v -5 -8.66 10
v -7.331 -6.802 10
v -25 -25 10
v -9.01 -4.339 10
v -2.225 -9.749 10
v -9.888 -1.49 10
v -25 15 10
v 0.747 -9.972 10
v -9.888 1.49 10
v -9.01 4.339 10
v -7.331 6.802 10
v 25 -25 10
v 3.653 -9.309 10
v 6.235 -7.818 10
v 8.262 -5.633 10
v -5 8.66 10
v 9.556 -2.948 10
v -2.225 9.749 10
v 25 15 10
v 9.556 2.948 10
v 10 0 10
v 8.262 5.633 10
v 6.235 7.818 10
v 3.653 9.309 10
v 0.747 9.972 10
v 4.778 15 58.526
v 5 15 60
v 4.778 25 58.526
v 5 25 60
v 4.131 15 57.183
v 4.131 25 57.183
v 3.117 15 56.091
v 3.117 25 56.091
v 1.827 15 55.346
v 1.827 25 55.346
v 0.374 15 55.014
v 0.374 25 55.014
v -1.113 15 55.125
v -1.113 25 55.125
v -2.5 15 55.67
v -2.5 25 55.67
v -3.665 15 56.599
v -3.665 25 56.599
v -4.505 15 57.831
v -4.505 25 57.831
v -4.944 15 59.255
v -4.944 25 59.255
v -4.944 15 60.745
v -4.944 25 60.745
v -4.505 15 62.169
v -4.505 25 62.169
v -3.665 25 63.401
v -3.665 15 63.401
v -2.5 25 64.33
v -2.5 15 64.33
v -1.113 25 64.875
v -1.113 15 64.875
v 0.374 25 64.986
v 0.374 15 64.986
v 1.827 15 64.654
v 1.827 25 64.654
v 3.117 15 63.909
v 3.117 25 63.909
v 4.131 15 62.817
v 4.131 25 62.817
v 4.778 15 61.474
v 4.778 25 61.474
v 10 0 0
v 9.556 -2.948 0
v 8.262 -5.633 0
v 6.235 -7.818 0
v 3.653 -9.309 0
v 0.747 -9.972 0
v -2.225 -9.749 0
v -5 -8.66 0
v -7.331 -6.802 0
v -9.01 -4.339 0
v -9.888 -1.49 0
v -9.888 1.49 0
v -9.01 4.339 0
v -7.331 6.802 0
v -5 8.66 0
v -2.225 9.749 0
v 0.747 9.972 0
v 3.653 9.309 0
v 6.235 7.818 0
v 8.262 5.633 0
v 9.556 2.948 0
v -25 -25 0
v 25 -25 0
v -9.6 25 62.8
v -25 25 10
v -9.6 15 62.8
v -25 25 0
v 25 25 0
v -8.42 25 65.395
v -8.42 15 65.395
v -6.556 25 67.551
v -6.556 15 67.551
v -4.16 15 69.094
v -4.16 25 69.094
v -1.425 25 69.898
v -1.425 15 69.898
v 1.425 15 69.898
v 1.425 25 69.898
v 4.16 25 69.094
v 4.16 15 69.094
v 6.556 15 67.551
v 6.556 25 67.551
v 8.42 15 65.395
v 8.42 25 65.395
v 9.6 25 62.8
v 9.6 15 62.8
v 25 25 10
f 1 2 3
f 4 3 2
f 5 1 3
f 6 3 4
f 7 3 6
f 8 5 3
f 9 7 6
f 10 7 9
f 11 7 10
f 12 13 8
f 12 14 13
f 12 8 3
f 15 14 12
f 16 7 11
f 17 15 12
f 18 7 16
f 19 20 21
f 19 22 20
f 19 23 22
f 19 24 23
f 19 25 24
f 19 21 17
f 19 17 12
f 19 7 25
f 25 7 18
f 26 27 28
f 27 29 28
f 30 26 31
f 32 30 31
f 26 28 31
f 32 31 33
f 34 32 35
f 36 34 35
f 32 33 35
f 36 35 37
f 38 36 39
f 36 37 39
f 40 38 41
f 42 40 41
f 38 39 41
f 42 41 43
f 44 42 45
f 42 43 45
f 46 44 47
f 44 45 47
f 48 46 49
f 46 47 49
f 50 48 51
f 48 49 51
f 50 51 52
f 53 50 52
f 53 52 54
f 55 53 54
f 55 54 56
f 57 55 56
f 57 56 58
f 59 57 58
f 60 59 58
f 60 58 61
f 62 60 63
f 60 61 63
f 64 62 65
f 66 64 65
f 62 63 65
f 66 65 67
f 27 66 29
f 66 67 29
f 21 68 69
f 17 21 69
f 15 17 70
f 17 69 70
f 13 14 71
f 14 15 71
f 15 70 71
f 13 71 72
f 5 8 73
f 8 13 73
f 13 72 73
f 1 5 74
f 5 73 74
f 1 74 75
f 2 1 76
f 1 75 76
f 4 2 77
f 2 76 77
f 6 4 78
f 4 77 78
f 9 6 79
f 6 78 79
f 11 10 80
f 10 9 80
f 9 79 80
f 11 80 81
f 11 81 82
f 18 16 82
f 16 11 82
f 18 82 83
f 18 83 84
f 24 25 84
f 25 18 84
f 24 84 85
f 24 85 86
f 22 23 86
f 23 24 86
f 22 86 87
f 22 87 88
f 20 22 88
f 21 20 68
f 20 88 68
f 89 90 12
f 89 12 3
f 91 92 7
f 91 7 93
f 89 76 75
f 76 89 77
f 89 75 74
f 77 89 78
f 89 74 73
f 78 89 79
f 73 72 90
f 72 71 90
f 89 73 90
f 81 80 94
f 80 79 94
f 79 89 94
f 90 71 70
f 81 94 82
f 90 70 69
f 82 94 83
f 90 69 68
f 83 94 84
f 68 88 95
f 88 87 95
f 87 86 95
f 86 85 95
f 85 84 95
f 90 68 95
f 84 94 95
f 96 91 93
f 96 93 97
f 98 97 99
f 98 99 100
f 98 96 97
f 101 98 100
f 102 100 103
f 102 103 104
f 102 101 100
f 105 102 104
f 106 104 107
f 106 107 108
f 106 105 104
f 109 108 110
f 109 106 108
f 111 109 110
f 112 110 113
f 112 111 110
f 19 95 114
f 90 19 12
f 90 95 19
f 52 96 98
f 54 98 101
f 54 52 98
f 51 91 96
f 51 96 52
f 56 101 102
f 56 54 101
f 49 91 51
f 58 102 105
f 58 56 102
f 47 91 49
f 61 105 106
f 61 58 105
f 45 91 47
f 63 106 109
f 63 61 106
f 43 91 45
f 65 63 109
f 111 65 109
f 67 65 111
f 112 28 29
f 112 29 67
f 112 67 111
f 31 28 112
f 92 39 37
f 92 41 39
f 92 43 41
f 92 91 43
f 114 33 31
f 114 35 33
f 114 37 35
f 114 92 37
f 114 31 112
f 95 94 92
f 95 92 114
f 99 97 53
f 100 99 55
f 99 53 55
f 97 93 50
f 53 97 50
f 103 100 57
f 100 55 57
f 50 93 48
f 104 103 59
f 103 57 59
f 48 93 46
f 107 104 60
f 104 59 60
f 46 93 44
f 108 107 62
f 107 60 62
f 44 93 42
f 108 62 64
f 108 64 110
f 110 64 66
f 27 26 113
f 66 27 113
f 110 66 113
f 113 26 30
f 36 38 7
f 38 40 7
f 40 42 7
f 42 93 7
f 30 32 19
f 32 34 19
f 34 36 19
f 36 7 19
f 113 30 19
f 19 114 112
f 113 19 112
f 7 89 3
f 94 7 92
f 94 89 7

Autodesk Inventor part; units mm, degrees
ref_plane "YZ Plane" through (0, 0, 0) normal (1, 0, 0) x (0, 1, 0)
ref_plane "XY Plane" through (0, 0, 0) normal (0, 0, 1) x (1, 0, 0)
sketch "Sketch1" plane through (0, 0, 0) normal (0, 0, 1) x (1, 0, 0)
  line L0 (-335.2657, 170.906) -> (-144.554, 170.906) construction
  line L1 (-144.554, 170.906) -> (-144.554, -100.0273) construction
  line L2 (-144.554, -100.0273) -> (-335.2657, -100.0273) construction
  line L3 (-335.2657, -100.0273) -> (-335.2657, 170.906) construction
  line L4 (-25, 25) -> (25, 25)
  line L5 (25, 25) -> (25, -25)
  line L6 (25, -25) -> (-25, -25)
  line L7 (-25, -25) -> (-25, 25)
  line L8 (-25, 25) -> (25, -25) construction
  line L9 (25, 25) -> (-25, -25) construction
  circle A0 centre (0, 0) radius 10
  dimension "d6" = 50
  dimension "d7" = 50
  dimension "d8" = 20
extrude "Extrusion1" add sketch "Sketch1" along normal blind 10
ref_plane "Work Plane1" through (0, 25, 0) normal (0, 1, 0) x (-1, 0, 0)
sketch "Sketch2" plane through (-25, 25, 0) normal (0, 1, 0) x (1, 0, 0)
  arc A0 (15.4, -62.8) -> (34.6, -62.8) centre (25, -60) ccw
  circle A1 centre (25, -60) radius 5
  line L0 (50, -10) -> (0, -10) projected
  line L1 (50, -10) -> (34.6, -62.8)
  line L2 (0, -10) -> (15.4, -62.8)
  line L3 (0, -10) -> (50, -10) projected
  line L4 (50, -10) -> (0, -10)
  line L5 (0, -10) -> (50, -10)
  point P0 (25, 0)
  dimension "d13" = 20
  dimension "d14" = 10
  dimension "d15" = 50
extrude "Extrusion2" add sketch "Sketch2" against normal blind 10
properties part number "cad@35"
